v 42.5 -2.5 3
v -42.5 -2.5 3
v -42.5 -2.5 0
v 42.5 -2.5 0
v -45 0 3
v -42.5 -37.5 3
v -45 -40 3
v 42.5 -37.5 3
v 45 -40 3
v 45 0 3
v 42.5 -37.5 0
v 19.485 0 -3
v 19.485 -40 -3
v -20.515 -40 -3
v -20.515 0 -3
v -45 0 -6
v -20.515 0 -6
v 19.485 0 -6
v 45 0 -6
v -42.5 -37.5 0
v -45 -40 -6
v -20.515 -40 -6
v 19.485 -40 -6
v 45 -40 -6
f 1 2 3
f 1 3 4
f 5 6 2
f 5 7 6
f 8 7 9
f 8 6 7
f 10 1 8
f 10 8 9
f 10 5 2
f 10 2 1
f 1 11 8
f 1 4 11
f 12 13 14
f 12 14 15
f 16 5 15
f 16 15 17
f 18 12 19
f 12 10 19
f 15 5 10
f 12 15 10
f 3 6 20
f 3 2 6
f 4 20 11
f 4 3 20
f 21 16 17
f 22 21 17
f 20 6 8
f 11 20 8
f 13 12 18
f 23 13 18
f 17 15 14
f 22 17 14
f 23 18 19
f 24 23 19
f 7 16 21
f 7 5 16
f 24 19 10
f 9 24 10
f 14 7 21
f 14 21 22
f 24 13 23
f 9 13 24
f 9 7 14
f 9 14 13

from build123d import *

# Parameters (mm, degrees)
F1_DEPTH  = 40
F2_W      = 84
F2_H      = 36
F3_DEPTH  = 3
F4_T      = -2.5
F5_DEPTH  = 3
F7_DEPTH  = 3
F6_W      = 40
F6_H      = 40
F8_DEPTH  = 3
F9_DEPTH  = 0.2
F10_DEPTH = 0.5


with BuildPart() as f1:
    # F0 (on Front) → F1 (new body)
    with BuildSketch(Plane.XZ):
        Polygon((45, -3), (45, 3), (-45, 3), (-45, -3), (-20.5147061497, -3), (-20.5147061497, 0), (19.4852938503, 0), (19.4852938503, -3), align=None)
    extrude(amount=F1_DEPTH)

    # F2 (on face) → F3 (join)
    with BuildSketch(Plane.XY.offset(3)):
        with Locations((0.0693308115, -20.004203001)):
            Rectangle(F2_W, F2_H)
    extrude(amount=-F3_DEPTH)

    # F4
    f4_openings = [f1.faces().sort_by_distance(p)[0] for p in [
        (0, -20, 3),
    ]]
    offset(amount=F4_T, openings=f4_openings, kind=Kind.INTERSECTION)

    # F5 (cut): a face of the model
    f5_faces = [f1.faces().sort_by_distance(p)[0] for p in [
        (-0.5147061497, -20, 2.5),
    ]]
    extrude(f5_faces, amount=-F5_DEPTH, mode=Mode.SUBTRACT)

    # F7 (add): faces of the model
    f7_faces = [f1.faces().sort_by_distance(p)[0] for p in [
        (-32.7573530748, -20, -3),
        (32.2426469252, -20, -3),
    ]]
    extrude(f7_faces, amount=F7_DEPTH)

    # F6 (on Top) → F8 (join)
    with BuildSketch(Plane.XY):
        with Locations((-0.3256309032, -20)):
            Rectangle(F6_W, F6_H)
    extrude(amount=-F8_DEPTH)

    # F9 (add): a face of the model
    f9_faces = [f1.faces().sort_by_distance(p)[0] for p in [
        (-20.3256309032, -20, -1.5),
    ]]
    extrude(f9_faces, amount=F9_DEPTH)

    # F10 (add): faces of the model
    f10_faces = [f1.faces().sort_by_distance(p)[0] for p in [
        (-31.5128154516, -20, -0.5),
        (31.0871845484, -20, -0.5),
    ]]
    extrude(f10_faces, amount=F10_DEPTH)


solid = f1.part
